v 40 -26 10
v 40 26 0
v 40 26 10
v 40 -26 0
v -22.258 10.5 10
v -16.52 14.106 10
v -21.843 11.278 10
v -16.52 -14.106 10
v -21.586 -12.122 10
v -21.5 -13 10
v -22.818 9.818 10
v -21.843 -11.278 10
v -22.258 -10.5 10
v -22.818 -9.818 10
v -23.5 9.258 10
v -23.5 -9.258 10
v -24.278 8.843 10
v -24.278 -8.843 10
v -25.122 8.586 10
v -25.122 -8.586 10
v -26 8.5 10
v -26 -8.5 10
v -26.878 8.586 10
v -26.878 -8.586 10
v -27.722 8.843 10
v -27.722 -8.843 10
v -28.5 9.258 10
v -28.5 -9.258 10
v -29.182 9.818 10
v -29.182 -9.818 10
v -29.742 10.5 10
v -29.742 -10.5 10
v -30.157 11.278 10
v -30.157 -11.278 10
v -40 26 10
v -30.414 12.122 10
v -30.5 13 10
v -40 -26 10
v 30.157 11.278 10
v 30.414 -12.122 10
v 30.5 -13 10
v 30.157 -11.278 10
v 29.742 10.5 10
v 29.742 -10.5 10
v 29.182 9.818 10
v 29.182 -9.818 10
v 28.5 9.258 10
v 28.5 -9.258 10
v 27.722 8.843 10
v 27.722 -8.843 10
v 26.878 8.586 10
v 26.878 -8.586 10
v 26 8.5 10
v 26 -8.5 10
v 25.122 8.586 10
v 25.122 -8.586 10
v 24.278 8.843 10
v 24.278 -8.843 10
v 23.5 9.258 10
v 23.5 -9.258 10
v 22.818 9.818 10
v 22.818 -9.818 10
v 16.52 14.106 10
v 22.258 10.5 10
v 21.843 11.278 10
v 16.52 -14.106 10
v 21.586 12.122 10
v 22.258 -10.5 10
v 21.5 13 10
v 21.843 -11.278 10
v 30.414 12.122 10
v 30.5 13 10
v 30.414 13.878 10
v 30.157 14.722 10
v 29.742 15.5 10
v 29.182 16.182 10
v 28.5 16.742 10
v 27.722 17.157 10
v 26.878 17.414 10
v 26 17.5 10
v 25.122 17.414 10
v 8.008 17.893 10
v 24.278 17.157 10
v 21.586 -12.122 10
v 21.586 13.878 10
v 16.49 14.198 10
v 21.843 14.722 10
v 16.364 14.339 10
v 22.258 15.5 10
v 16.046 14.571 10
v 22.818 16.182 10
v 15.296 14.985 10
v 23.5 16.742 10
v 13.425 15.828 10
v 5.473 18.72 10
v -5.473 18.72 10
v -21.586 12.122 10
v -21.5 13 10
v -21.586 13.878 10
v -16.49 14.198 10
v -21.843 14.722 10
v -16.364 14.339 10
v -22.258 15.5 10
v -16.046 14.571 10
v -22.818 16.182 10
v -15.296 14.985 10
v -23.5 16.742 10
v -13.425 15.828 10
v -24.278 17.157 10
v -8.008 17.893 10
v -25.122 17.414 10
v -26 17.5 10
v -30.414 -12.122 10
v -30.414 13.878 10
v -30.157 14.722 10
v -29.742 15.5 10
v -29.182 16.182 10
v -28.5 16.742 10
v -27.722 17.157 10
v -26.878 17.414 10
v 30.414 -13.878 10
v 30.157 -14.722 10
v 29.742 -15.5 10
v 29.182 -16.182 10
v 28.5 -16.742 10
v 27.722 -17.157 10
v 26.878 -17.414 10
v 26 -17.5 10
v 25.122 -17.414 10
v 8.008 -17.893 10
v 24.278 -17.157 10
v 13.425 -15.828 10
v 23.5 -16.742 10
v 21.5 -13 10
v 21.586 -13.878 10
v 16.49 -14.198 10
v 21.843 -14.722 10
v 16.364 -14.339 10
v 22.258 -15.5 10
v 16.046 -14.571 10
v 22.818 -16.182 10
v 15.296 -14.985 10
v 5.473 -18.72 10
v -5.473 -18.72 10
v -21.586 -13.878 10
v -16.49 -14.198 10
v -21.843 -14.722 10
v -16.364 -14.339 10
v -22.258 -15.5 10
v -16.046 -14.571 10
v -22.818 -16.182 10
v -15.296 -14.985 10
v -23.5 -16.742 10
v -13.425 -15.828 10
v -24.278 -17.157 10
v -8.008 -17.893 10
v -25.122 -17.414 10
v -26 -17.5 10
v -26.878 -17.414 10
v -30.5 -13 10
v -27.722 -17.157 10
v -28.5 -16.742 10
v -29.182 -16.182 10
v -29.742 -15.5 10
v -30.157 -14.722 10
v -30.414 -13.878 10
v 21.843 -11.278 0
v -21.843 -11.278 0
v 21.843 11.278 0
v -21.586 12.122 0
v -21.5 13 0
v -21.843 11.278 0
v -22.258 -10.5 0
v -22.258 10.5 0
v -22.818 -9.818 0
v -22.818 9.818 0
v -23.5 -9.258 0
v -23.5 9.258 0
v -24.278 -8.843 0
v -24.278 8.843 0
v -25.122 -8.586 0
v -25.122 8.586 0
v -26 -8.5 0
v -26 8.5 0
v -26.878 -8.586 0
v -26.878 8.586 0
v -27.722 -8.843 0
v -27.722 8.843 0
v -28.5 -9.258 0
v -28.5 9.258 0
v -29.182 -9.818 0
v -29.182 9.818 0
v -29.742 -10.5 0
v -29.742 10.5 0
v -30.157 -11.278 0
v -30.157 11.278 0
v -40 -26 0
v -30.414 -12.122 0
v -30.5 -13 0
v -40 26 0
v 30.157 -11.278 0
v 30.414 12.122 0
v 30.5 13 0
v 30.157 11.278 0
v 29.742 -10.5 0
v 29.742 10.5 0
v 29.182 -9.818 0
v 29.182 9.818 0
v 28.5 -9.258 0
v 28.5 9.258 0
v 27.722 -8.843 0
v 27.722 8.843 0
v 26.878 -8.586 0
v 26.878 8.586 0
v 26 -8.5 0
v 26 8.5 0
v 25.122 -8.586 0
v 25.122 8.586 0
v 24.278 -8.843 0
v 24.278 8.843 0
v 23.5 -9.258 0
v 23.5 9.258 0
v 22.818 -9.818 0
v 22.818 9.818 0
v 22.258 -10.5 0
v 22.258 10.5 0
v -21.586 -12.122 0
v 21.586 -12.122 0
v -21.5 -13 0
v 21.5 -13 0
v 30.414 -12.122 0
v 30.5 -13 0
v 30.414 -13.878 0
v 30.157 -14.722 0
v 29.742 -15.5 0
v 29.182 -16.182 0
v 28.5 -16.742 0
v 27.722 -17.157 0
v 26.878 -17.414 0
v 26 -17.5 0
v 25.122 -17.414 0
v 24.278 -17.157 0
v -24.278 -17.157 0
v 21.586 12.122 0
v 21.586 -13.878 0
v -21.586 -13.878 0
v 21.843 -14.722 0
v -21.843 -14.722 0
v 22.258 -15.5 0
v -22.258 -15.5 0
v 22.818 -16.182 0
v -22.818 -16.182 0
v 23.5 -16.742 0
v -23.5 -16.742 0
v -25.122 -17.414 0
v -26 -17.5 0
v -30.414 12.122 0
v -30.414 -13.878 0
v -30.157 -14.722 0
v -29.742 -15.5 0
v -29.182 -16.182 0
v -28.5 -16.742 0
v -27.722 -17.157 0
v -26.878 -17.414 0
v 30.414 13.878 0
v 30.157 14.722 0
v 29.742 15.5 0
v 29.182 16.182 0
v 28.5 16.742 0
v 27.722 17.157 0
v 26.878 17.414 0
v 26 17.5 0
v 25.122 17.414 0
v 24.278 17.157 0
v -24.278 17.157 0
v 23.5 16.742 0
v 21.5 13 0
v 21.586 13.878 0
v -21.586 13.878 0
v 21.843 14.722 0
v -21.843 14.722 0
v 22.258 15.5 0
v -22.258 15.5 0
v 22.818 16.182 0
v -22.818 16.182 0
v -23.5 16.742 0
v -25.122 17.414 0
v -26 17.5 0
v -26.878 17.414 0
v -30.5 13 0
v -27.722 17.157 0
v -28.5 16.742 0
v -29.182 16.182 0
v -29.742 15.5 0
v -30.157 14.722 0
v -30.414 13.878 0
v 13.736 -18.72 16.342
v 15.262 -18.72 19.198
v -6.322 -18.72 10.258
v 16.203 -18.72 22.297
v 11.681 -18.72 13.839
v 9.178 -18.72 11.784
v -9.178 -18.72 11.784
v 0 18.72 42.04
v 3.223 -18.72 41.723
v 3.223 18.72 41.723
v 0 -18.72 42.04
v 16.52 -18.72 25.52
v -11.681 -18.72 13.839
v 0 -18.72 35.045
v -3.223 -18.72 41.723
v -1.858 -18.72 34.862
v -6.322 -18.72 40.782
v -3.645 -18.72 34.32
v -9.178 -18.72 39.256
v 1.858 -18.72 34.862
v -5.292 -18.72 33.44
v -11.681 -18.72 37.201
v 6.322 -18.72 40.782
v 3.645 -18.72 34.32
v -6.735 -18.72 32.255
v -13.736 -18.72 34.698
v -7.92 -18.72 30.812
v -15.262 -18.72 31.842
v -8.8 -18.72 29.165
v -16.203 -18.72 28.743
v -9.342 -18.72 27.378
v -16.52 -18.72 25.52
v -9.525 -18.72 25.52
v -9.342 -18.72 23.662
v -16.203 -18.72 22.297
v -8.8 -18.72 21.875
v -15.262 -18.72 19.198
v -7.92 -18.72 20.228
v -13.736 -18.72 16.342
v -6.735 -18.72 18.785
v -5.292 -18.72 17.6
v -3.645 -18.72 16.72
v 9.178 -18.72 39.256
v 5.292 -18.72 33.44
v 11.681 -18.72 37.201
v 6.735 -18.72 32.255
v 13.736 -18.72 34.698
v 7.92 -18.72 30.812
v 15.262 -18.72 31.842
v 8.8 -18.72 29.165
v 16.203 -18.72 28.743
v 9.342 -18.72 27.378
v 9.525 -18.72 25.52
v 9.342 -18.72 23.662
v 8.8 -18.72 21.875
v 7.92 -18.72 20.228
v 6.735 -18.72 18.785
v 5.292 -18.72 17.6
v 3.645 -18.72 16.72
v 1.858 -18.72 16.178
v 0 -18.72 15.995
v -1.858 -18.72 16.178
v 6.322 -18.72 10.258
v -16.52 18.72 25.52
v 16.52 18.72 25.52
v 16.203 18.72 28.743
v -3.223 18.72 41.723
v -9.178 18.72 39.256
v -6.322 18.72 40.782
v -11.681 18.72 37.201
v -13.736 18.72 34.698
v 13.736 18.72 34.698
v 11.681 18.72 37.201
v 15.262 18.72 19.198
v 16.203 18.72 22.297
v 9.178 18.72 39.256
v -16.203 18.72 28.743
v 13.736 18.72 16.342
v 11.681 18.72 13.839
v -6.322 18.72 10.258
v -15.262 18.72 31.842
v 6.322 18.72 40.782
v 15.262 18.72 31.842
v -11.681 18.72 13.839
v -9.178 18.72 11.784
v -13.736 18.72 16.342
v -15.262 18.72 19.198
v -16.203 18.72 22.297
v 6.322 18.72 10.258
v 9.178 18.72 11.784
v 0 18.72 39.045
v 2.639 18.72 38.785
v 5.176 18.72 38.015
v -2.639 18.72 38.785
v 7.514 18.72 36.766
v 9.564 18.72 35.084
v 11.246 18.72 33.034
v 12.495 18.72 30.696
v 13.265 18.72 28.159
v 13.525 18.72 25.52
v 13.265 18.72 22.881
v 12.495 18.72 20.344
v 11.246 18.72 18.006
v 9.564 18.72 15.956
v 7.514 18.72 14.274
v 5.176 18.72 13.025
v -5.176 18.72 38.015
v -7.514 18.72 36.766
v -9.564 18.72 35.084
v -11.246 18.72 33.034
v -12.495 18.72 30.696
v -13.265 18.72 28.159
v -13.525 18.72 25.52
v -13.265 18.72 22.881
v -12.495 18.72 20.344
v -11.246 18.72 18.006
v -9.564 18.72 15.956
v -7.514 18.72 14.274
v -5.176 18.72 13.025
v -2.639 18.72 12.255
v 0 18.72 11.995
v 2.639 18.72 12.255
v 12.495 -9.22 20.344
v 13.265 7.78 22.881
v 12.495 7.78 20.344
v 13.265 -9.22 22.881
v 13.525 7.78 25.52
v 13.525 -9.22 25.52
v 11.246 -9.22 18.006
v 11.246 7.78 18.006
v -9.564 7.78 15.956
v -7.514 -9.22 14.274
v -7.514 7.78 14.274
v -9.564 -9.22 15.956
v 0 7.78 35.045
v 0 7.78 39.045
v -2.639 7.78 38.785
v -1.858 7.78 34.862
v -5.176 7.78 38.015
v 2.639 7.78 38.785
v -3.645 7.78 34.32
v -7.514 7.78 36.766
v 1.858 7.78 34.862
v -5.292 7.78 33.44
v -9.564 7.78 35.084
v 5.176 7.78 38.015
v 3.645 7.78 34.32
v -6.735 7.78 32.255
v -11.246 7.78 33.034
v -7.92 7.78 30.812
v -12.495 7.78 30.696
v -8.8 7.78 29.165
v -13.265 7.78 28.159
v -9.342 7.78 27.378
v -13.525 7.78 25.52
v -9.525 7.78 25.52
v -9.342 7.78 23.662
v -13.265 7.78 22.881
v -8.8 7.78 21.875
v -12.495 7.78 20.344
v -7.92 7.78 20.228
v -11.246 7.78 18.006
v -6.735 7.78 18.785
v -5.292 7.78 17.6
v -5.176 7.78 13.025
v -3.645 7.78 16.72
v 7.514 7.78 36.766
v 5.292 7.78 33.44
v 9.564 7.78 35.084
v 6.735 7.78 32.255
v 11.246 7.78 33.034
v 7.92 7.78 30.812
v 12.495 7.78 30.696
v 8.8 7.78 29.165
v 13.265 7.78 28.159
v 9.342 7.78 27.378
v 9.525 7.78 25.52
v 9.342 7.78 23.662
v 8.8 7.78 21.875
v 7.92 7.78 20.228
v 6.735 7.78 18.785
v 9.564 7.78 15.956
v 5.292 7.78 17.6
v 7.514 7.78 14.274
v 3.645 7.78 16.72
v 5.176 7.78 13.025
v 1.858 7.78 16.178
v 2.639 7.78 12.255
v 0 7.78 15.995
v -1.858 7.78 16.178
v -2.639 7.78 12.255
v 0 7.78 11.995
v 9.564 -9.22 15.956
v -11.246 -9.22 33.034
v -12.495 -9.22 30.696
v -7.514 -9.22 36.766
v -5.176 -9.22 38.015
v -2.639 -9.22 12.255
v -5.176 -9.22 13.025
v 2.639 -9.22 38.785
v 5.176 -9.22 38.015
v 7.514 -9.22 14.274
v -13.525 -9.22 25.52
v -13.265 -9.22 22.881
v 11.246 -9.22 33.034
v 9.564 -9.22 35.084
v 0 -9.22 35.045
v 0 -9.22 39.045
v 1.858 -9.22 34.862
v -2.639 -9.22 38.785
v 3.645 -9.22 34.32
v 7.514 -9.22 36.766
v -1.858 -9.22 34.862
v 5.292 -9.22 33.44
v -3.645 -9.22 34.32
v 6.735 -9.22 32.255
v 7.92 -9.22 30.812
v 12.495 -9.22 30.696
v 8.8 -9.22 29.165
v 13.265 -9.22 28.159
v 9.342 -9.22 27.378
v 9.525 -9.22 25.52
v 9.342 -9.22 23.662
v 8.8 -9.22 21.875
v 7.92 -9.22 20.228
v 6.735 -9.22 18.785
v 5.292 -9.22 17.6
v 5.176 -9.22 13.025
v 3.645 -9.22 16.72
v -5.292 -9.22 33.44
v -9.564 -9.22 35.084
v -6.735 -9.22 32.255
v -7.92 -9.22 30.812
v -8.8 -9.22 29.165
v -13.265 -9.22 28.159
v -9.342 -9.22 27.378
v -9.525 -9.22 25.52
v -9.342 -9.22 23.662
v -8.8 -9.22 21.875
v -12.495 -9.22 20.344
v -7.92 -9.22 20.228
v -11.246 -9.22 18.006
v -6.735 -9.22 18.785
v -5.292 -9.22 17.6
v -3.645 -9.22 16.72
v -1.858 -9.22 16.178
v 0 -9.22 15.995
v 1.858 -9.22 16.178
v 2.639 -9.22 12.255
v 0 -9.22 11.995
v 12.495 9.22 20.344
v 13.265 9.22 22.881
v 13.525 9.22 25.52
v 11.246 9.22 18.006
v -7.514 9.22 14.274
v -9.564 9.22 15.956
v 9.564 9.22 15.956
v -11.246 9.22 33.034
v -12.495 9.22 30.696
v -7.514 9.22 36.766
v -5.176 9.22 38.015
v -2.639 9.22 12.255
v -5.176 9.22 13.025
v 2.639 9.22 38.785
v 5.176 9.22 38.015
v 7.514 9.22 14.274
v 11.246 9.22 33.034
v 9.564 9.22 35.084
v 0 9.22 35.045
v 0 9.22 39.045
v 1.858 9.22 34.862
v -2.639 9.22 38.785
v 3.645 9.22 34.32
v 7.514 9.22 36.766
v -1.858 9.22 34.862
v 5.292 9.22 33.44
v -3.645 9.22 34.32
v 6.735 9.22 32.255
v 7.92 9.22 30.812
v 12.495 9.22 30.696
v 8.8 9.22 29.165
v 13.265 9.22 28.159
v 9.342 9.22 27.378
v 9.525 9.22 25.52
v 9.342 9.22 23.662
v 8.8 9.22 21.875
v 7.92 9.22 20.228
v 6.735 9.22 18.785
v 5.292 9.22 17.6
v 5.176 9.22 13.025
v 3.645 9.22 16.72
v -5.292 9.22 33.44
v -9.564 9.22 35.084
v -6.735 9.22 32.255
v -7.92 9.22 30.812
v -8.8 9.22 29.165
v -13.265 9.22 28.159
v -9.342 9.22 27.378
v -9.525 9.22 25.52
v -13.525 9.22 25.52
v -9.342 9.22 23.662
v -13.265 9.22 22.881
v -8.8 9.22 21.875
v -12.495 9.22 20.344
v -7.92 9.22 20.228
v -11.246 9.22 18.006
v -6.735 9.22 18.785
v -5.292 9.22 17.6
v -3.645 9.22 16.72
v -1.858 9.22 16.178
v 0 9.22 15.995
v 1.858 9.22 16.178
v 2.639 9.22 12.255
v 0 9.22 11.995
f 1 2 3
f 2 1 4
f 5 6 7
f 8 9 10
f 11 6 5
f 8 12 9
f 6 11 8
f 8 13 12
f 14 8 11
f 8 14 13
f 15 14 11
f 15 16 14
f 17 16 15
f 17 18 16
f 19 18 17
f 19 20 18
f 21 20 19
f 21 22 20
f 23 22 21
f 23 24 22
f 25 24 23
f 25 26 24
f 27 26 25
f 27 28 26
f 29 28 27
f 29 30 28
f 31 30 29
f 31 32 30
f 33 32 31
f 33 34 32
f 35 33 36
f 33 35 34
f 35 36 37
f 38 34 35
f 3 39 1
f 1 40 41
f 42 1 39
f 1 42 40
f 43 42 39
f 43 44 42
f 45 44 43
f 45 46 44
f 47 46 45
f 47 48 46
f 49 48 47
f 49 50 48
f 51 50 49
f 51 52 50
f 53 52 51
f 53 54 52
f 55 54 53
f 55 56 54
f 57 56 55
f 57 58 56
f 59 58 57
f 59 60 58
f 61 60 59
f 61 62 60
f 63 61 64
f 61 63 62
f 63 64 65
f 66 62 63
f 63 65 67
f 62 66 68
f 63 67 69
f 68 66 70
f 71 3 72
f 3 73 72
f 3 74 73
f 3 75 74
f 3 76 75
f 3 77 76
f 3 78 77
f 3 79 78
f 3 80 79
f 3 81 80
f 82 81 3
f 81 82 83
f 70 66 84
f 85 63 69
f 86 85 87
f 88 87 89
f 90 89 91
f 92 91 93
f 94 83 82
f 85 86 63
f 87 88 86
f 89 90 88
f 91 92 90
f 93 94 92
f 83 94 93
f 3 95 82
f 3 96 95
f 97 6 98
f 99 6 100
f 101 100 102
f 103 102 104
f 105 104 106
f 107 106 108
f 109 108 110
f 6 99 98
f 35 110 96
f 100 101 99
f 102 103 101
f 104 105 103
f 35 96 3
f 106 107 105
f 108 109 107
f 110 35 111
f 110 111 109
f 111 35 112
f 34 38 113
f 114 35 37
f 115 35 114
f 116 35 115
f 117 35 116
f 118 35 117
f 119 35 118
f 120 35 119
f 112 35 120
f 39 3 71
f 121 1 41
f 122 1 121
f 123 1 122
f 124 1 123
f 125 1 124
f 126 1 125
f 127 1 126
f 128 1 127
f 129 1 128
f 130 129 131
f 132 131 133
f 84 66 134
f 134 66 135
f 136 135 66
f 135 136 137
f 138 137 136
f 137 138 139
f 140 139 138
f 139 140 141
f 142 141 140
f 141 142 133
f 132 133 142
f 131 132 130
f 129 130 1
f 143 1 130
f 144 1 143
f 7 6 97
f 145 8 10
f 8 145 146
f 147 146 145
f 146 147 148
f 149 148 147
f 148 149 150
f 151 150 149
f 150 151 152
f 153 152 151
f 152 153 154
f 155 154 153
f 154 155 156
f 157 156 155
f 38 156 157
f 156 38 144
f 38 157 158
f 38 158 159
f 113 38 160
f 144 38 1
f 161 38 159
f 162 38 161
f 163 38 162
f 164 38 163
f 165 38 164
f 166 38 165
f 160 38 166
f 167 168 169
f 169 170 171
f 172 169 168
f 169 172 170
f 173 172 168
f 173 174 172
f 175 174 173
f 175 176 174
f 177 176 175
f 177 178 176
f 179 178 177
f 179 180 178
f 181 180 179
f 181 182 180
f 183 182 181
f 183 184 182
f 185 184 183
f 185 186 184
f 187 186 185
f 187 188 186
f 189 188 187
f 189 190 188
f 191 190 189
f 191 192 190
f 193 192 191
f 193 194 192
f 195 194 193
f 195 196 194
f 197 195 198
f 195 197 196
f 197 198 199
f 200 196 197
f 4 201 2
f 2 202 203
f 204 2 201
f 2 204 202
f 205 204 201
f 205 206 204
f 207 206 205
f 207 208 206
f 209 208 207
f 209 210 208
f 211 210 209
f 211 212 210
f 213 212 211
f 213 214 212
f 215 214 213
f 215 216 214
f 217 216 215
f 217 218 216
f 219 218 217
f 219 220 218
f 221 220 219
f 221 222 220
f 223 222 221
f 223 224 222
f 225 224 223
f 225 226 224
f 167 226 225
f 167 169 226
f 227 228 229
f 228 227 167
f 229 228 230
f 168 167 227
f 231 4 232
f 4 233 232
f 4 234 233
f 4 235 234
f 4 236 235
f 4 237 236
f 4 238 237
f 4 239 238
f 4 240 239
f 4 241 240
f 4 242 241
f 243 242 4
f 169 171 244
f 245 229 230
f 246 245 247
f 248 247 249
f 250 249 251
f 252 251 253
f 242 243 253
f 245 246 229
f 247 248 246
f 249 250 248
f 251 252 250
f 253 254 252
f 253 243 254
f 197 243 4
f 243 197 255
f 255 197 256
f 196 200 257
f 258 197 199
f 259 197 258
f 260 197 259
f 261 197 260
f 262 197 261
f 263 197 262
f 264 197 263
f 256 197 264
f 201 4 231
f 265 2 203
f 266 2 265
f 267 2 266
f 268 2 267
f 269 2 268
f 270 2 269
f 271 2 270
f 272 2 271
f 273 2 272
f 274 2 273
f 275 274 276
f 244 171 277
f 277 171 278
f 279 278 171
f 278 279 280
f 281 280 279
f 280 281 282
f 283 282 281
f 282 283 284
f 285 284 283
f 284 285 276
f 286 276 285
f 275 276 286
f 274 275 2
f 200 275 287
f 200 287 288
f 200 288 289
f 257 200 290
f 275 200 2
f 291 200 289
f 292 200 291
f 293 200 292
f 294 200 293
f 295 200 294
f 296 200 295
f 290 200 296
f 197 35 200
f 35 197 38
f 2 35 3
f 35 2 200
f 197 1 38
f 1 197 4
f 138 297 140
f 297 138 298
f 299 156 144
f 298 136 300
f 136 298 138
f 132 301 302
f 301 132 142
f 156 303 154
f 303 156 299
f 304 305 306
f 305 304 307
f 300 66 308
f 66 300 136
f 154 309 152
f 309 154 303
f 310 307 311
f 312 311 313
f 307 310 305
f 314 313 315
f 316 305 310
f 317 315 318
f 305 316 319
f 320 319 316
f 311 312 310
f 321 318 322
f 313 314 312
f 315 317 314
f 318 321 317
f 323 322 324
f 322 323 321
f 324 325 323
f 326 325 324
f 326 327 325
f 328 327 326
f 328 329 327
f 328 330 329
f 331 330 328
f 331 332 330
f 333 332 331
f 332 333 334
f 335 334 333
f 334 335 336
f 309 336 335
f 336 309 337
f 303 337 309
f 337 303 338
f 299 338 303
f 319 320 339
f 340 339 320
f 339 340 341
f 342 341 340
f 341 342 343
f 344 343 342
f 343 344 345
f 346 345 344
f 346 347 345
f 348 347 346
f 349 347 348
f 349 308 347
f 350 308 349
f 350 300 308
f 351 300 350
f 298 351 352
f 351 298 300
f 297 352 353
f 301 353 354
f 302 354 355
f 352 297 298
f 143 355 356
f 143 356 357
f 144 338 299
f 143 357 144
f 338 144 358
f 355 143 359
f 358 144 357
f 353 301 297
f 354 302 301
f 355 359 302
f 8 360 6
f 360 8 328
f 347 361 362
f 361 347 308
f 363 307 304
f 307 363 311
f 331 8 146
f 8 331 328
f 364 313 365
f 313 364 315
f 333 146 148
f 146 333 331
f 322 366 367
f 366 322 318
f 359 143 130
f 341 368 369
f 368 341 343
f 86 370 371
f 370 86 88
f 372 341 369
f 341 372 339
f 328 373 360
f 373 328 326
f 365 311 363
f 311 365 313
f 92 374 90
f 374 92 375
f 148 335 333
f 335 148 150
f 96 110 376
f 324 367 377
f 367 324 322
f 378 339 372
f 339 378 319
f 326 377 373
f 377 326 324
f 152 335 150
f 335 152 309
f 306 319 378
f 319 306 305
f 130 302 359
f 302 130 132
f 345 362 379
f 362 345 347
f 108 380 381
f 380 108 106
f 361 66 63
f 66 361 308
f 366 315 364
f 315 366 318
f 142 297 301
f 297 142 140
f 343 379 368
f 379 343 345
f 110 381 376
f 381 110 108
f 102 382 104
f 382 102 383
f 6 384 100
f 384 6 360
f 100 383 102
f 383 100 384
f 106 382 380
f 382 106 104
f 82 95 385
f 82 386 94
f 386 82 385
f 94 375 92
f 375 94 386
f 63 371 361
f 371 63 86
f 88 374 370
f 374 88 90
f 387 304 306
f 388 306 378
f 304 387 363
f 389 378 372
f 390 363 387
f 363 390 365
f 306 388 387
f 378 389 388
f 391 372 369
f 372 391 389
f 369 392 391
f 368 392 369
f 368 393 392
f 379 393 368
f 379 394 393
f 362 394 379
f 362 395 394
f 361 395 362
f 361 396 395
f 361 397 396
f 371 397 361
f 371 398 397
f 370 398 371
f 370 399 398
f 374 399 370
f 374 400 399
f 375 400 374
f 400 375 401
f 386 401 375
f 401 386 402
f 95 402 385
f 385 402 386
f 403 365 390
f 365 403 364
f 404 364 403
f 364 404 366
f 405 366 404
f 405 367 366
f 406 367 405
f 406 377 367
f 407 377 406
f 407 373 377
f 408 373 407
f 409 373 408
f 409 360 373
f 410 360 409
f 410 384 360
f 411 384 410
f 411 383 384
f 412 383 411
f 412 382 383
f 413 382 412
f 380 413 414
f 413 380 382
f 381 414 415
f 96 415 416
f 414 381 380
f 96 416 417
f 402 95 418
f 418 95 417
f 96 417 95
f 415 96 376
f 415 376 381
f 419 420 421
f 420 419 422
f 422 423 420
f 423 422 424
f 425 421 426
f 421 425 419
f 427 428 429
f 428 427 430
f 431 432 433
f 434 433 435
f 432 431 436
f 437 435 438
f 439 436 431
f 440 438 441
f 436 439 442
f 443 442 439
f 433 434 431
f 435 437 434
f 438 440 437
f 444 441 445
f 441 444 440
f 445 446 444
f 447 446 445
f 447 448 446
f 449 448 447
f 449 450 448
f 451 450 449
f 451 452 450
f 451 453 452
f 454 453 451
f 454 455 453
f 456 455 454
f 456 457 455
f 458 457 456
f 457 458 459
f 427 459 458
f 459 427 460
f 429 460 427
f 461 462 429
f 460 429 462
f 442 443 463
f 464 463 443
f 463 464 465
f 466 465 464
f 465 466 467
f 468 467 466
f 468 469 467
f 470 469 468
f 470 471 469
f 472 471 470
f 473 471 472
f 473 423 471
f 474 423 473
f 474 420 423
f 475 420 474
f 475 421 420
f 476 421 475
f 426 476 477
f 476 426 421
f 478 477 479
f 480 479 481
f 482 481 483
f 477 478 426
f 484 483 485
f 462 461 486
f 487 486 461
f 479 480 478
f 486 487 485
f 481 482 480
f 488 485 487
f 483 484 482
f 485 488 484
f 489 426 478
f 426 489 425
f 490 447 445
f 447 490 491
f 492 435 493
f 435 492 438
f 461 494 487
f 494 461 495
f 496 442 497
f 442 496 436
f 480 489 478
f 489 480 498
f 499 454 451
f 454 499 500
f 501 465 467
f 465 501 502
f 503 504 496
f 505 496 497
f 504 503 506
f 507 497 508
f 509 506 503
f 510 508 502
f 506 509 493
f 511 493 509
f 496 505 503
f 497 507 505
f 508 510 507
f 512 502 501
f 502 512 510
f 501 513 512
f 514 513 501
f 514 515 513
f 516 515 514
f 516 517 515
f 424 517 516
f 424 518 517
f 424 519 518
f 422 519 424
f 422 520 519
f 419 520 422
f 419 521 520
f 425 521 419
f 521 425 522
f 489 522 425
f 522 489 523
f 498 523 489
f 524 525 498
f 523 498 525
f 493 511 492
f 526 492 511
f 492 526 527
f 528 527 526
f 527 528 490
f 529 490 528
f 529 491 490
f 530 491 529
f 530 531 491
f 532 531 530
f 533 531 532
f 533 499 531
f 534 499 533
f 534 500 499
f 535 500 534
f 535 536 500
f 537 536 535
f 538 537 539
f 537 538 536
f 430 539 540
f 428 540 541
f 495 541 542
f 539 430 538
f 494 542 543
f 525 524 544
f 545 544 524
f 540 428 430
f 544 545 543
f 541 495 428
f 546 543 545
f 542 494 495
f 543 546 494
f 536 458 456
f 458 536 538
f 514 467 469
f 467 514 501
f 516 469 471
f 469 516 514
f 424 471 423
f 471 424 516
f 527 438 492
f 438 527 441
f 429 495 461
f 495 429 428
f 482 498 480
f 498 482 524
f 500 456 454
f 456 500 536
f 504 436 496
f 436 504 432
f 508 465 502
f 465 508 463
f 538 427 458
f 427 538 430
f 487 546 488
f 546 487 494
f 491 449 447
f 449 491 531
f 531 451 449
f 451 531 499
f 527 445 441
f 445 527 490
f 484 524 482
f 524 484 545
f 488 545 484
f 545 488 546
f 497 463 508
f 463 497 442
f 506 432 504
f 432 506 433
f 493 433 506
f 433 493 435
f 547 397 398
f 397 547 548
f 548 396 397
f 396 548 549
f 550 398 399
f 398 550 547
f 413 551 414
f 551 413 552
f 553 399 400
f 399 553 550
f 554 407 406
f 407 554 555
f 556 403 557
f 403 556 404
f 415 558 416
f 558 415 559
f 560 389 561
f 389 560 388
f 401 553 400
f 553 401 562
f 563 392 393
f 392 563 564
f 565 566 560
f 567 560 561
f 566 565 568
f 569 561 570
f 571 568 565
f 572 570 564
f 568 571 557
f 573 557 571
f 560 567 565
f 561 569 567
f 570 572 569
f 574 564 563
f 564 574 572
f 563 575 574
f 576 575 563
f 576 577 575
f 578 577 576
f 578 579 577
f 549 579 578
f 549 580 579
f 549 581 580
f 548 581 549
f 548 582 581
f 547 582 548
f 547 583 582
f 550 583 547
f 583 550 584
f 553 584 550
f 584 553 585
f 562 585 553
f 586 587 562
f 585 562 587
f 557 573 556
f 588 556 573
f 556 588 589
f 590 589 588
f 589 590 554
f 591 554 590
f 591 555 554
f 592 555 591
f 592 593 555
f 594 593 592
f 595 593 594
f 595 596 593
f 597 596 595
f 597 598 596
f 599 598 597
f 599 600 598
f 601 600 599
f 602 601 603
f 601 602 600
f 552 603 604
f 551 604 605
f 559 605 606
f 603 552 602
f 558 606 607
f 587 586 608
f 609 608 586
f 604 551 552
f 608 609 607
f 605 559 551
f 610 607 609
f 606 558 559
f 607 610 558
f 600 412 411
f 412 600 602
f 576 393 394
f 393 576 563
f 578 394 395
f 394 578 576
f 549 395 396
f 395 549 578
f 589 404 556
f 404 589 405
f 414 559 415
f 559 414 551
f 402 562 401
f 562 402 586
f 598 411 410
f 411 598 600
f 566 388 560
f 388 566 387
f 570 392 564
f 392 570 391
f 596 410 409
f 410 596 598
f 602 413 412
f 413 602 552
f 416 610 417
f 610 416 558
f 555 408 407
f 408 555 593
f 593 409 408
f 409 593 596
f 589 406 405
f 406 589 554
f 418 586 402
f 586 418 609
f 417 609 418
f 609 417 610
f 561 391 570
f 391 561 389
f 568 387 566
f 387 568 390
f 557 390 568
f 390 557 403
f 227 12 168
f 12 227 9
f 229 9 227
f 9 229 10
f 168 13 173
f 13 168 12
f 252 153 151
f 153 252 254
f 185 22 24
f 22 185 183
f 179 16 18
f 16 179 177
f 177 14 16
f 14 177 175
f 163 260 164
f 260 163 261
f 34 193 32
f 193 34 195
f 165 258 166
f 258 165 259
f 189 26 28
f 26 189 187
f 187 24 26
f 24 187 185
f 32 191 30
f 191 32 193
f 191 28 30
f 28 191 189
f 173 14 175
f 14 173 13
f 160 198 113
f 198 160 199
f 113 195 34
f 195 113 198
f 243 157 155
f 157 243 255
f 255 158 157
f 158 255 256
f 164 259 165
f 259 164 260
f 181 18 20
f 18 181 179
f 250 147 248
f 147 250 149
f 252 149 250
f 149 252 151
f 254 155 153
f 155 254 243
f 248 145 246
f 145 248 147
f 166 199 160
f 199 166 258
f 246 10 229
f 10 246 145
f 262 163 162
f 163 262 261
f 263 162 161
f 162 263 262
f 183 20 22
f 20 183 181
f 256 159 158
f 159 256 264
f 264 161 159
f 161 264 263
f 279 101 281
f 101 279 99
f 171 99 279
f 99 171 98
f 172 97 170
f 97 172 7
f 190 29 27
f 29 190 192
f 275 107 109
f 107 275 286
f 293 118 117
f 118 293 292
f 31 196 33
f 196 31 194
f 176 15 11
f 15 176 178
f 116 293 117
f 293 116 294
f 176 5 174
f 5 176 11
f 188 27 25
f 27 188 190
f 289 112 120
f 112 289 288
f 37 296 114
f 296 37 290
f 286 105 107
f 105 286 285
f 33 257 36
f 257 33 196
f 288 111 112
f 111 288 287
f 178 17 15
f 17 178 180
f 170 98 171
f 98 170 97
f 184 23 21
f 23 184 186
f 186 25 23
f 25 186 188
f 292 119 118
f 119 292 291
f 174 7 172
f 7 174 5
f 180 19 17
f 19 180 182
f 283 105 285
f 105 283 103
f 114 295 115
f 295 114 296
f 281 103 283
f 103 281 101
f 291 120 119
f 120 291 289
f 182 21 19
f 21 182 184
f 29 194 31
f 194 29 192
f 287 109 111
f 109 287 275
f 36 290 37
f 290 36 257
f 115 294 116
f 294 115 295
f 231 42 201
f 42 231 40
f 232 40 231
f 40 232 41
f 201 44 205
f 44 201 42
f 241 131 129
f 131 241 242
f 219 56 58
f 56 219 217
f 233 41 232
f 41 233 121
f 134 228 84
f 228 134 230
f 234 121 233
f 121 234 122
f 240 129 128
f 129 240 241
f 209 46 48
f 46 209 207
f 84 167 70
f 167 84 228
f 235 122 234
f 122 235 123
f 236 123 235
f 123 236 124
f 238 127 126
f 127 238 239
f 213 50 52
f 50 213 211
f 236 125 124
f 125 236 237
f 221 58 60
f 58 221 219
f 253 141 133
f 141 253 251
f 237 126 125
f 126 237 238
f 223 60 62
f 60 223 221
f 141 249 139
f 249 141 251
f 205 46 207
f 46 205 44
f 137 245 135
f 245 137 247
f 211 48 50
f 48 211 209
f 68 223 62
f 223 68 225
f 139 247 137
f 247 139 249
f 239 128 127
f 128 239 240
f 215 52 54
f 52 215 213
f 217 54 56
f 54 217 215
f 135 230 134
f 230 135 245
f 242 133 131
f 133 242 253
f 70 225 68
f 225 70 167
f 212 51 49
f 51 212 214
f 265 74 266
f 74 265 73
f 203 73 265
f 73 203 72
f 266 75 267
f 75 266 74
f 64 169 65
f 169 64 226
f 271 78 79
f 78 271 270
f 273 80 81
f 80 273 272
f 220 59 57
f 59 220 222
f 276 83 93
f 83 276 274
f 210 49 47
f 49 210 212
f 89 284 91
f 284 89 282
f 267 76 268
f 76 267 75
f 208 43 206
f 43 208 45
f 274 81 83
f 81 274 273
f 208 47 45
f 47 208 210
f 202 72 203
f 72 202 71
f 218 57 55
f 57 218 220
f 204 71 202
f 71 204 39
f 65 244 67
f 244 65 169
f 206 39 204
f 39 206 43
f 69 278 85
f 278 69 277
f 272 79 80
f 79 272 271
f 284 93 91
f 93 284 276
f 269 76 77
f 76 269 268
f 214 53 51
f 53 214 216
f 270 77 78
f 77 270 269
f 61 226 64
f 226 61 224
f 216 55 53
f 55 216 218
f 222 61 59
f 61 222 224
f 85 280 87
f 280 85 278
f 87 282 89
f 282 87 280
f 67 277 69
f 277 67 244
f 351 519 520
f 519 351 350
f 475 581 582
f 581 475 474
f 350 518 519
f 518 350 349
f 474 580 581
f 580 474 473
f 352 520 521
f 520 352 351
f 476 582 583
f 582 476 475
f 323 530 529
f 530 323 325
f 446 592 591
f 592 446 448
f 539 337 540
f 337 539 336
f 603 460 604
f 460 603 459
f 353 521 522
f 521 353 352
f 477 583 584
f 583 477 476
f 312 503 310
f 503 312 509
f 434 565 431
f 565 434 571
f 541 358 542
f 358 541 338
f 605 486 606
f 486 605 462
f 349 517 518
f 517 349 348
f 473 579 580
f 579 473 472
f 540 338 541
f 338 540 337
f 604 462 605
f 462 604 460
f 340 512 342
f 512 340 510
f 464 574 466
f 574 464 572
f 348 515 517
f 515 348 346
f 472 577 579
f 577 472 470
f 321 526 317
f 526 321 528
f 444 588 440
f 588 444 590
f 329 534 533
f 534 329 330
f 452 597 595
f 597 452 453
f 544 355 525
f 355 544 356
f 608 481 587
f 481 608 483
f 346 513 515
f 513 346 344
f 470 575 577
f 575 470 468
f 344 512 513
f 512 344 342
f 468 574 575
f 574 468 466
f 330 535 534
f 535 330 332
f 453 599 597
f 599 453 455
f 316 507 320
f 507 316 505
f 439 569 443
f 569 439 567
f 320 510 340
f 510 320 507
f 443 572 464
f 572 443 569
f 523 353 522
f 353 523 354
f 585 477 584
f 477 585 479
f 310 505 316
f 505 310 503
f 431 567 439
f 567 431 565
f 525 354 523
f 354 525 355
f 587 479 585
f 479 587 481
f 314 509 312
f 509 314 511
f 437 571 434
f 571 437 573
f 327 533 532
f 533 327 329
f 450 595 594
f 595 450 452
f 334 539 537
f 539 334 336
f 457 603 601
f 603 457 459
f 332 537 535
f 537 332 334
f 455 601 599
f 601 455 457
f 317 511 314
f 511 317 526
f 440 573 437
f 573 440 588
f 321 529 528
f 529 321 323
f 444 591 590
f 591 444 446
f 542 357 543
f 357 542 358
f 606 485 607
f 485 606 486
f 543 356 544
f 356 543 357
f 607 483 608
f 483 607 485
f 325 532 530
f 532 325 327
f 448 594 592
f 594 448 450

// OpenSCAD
$fn = 32;

// ----------------------------------------------------------------------
// Bearing block: 80 x 52 mm base, 19.05 mm bore at 25.52 mm
// ----------------------------------------------------------------------

// --- parameters (mm) ---
base_w = 80;              // base width
base_d = 52;              // base depth
base_t = 10;              // base thickness
bore_d = 19.05;           // shaft / bearing bore
house_r = 16.52;          // housing outer radius
house_len = 37.44;        // housing length along the shaft
foot_w = 33.04;           // foot width under the housing
foot_len = 27.44;         // foot length along the shaft
axis_z = 25.52;           // bore axis height above the base
holes_d = 9;              // mounting holes
hole_x = 26;              // mounting hole spacing
seat_d = 12;              // bearing seat depth
seat_wall = 4;            // seat wall thickness

difference() {
  union() {
    /* base plate with its underside on z = 0 */
    translate([0, 0, base_t / 2]) cube([base_w, base_d, base_t], center = true);
    /* hull foot: a straight web blending into the round housing */
    hull() {
      translate([0, 0, base_t - 0.5]) cube([foot_w, foot_len, 1.6], center = true);
      translate([0, 0, axis_z]) rotate([-90, 0, 0]) cylinder(h = house_len, d = 2 * house_r, center = true);
    }
  }
  /* bore through the housing, 2.5 mm clear on both sides */
  translate([0, 0, axis_z]) rotate([-90, 0, 0]) cylinder(h = house_len + 5, d = bore_d, center = true);
  /* bearing seats, recessed into both ends of the housing */
  for (sy = [-1, 1]) {
    translate([0, sy * (house_len / 2 - seat_d + 2.5), axis_z]) rotate([-90, 0, 0]) cylinder(h = seat_d + 5, d = bore_d + 2 * seat_wall);
  }
  /* mounting holes through the base plate */
  for (hx = [-26, 26]) {
    for (hy = [-13, 13]) {
      translate([hx, hy, -2.5]) cylinder(h = base_t + 5, d = holes_d);
    }
  }
}
